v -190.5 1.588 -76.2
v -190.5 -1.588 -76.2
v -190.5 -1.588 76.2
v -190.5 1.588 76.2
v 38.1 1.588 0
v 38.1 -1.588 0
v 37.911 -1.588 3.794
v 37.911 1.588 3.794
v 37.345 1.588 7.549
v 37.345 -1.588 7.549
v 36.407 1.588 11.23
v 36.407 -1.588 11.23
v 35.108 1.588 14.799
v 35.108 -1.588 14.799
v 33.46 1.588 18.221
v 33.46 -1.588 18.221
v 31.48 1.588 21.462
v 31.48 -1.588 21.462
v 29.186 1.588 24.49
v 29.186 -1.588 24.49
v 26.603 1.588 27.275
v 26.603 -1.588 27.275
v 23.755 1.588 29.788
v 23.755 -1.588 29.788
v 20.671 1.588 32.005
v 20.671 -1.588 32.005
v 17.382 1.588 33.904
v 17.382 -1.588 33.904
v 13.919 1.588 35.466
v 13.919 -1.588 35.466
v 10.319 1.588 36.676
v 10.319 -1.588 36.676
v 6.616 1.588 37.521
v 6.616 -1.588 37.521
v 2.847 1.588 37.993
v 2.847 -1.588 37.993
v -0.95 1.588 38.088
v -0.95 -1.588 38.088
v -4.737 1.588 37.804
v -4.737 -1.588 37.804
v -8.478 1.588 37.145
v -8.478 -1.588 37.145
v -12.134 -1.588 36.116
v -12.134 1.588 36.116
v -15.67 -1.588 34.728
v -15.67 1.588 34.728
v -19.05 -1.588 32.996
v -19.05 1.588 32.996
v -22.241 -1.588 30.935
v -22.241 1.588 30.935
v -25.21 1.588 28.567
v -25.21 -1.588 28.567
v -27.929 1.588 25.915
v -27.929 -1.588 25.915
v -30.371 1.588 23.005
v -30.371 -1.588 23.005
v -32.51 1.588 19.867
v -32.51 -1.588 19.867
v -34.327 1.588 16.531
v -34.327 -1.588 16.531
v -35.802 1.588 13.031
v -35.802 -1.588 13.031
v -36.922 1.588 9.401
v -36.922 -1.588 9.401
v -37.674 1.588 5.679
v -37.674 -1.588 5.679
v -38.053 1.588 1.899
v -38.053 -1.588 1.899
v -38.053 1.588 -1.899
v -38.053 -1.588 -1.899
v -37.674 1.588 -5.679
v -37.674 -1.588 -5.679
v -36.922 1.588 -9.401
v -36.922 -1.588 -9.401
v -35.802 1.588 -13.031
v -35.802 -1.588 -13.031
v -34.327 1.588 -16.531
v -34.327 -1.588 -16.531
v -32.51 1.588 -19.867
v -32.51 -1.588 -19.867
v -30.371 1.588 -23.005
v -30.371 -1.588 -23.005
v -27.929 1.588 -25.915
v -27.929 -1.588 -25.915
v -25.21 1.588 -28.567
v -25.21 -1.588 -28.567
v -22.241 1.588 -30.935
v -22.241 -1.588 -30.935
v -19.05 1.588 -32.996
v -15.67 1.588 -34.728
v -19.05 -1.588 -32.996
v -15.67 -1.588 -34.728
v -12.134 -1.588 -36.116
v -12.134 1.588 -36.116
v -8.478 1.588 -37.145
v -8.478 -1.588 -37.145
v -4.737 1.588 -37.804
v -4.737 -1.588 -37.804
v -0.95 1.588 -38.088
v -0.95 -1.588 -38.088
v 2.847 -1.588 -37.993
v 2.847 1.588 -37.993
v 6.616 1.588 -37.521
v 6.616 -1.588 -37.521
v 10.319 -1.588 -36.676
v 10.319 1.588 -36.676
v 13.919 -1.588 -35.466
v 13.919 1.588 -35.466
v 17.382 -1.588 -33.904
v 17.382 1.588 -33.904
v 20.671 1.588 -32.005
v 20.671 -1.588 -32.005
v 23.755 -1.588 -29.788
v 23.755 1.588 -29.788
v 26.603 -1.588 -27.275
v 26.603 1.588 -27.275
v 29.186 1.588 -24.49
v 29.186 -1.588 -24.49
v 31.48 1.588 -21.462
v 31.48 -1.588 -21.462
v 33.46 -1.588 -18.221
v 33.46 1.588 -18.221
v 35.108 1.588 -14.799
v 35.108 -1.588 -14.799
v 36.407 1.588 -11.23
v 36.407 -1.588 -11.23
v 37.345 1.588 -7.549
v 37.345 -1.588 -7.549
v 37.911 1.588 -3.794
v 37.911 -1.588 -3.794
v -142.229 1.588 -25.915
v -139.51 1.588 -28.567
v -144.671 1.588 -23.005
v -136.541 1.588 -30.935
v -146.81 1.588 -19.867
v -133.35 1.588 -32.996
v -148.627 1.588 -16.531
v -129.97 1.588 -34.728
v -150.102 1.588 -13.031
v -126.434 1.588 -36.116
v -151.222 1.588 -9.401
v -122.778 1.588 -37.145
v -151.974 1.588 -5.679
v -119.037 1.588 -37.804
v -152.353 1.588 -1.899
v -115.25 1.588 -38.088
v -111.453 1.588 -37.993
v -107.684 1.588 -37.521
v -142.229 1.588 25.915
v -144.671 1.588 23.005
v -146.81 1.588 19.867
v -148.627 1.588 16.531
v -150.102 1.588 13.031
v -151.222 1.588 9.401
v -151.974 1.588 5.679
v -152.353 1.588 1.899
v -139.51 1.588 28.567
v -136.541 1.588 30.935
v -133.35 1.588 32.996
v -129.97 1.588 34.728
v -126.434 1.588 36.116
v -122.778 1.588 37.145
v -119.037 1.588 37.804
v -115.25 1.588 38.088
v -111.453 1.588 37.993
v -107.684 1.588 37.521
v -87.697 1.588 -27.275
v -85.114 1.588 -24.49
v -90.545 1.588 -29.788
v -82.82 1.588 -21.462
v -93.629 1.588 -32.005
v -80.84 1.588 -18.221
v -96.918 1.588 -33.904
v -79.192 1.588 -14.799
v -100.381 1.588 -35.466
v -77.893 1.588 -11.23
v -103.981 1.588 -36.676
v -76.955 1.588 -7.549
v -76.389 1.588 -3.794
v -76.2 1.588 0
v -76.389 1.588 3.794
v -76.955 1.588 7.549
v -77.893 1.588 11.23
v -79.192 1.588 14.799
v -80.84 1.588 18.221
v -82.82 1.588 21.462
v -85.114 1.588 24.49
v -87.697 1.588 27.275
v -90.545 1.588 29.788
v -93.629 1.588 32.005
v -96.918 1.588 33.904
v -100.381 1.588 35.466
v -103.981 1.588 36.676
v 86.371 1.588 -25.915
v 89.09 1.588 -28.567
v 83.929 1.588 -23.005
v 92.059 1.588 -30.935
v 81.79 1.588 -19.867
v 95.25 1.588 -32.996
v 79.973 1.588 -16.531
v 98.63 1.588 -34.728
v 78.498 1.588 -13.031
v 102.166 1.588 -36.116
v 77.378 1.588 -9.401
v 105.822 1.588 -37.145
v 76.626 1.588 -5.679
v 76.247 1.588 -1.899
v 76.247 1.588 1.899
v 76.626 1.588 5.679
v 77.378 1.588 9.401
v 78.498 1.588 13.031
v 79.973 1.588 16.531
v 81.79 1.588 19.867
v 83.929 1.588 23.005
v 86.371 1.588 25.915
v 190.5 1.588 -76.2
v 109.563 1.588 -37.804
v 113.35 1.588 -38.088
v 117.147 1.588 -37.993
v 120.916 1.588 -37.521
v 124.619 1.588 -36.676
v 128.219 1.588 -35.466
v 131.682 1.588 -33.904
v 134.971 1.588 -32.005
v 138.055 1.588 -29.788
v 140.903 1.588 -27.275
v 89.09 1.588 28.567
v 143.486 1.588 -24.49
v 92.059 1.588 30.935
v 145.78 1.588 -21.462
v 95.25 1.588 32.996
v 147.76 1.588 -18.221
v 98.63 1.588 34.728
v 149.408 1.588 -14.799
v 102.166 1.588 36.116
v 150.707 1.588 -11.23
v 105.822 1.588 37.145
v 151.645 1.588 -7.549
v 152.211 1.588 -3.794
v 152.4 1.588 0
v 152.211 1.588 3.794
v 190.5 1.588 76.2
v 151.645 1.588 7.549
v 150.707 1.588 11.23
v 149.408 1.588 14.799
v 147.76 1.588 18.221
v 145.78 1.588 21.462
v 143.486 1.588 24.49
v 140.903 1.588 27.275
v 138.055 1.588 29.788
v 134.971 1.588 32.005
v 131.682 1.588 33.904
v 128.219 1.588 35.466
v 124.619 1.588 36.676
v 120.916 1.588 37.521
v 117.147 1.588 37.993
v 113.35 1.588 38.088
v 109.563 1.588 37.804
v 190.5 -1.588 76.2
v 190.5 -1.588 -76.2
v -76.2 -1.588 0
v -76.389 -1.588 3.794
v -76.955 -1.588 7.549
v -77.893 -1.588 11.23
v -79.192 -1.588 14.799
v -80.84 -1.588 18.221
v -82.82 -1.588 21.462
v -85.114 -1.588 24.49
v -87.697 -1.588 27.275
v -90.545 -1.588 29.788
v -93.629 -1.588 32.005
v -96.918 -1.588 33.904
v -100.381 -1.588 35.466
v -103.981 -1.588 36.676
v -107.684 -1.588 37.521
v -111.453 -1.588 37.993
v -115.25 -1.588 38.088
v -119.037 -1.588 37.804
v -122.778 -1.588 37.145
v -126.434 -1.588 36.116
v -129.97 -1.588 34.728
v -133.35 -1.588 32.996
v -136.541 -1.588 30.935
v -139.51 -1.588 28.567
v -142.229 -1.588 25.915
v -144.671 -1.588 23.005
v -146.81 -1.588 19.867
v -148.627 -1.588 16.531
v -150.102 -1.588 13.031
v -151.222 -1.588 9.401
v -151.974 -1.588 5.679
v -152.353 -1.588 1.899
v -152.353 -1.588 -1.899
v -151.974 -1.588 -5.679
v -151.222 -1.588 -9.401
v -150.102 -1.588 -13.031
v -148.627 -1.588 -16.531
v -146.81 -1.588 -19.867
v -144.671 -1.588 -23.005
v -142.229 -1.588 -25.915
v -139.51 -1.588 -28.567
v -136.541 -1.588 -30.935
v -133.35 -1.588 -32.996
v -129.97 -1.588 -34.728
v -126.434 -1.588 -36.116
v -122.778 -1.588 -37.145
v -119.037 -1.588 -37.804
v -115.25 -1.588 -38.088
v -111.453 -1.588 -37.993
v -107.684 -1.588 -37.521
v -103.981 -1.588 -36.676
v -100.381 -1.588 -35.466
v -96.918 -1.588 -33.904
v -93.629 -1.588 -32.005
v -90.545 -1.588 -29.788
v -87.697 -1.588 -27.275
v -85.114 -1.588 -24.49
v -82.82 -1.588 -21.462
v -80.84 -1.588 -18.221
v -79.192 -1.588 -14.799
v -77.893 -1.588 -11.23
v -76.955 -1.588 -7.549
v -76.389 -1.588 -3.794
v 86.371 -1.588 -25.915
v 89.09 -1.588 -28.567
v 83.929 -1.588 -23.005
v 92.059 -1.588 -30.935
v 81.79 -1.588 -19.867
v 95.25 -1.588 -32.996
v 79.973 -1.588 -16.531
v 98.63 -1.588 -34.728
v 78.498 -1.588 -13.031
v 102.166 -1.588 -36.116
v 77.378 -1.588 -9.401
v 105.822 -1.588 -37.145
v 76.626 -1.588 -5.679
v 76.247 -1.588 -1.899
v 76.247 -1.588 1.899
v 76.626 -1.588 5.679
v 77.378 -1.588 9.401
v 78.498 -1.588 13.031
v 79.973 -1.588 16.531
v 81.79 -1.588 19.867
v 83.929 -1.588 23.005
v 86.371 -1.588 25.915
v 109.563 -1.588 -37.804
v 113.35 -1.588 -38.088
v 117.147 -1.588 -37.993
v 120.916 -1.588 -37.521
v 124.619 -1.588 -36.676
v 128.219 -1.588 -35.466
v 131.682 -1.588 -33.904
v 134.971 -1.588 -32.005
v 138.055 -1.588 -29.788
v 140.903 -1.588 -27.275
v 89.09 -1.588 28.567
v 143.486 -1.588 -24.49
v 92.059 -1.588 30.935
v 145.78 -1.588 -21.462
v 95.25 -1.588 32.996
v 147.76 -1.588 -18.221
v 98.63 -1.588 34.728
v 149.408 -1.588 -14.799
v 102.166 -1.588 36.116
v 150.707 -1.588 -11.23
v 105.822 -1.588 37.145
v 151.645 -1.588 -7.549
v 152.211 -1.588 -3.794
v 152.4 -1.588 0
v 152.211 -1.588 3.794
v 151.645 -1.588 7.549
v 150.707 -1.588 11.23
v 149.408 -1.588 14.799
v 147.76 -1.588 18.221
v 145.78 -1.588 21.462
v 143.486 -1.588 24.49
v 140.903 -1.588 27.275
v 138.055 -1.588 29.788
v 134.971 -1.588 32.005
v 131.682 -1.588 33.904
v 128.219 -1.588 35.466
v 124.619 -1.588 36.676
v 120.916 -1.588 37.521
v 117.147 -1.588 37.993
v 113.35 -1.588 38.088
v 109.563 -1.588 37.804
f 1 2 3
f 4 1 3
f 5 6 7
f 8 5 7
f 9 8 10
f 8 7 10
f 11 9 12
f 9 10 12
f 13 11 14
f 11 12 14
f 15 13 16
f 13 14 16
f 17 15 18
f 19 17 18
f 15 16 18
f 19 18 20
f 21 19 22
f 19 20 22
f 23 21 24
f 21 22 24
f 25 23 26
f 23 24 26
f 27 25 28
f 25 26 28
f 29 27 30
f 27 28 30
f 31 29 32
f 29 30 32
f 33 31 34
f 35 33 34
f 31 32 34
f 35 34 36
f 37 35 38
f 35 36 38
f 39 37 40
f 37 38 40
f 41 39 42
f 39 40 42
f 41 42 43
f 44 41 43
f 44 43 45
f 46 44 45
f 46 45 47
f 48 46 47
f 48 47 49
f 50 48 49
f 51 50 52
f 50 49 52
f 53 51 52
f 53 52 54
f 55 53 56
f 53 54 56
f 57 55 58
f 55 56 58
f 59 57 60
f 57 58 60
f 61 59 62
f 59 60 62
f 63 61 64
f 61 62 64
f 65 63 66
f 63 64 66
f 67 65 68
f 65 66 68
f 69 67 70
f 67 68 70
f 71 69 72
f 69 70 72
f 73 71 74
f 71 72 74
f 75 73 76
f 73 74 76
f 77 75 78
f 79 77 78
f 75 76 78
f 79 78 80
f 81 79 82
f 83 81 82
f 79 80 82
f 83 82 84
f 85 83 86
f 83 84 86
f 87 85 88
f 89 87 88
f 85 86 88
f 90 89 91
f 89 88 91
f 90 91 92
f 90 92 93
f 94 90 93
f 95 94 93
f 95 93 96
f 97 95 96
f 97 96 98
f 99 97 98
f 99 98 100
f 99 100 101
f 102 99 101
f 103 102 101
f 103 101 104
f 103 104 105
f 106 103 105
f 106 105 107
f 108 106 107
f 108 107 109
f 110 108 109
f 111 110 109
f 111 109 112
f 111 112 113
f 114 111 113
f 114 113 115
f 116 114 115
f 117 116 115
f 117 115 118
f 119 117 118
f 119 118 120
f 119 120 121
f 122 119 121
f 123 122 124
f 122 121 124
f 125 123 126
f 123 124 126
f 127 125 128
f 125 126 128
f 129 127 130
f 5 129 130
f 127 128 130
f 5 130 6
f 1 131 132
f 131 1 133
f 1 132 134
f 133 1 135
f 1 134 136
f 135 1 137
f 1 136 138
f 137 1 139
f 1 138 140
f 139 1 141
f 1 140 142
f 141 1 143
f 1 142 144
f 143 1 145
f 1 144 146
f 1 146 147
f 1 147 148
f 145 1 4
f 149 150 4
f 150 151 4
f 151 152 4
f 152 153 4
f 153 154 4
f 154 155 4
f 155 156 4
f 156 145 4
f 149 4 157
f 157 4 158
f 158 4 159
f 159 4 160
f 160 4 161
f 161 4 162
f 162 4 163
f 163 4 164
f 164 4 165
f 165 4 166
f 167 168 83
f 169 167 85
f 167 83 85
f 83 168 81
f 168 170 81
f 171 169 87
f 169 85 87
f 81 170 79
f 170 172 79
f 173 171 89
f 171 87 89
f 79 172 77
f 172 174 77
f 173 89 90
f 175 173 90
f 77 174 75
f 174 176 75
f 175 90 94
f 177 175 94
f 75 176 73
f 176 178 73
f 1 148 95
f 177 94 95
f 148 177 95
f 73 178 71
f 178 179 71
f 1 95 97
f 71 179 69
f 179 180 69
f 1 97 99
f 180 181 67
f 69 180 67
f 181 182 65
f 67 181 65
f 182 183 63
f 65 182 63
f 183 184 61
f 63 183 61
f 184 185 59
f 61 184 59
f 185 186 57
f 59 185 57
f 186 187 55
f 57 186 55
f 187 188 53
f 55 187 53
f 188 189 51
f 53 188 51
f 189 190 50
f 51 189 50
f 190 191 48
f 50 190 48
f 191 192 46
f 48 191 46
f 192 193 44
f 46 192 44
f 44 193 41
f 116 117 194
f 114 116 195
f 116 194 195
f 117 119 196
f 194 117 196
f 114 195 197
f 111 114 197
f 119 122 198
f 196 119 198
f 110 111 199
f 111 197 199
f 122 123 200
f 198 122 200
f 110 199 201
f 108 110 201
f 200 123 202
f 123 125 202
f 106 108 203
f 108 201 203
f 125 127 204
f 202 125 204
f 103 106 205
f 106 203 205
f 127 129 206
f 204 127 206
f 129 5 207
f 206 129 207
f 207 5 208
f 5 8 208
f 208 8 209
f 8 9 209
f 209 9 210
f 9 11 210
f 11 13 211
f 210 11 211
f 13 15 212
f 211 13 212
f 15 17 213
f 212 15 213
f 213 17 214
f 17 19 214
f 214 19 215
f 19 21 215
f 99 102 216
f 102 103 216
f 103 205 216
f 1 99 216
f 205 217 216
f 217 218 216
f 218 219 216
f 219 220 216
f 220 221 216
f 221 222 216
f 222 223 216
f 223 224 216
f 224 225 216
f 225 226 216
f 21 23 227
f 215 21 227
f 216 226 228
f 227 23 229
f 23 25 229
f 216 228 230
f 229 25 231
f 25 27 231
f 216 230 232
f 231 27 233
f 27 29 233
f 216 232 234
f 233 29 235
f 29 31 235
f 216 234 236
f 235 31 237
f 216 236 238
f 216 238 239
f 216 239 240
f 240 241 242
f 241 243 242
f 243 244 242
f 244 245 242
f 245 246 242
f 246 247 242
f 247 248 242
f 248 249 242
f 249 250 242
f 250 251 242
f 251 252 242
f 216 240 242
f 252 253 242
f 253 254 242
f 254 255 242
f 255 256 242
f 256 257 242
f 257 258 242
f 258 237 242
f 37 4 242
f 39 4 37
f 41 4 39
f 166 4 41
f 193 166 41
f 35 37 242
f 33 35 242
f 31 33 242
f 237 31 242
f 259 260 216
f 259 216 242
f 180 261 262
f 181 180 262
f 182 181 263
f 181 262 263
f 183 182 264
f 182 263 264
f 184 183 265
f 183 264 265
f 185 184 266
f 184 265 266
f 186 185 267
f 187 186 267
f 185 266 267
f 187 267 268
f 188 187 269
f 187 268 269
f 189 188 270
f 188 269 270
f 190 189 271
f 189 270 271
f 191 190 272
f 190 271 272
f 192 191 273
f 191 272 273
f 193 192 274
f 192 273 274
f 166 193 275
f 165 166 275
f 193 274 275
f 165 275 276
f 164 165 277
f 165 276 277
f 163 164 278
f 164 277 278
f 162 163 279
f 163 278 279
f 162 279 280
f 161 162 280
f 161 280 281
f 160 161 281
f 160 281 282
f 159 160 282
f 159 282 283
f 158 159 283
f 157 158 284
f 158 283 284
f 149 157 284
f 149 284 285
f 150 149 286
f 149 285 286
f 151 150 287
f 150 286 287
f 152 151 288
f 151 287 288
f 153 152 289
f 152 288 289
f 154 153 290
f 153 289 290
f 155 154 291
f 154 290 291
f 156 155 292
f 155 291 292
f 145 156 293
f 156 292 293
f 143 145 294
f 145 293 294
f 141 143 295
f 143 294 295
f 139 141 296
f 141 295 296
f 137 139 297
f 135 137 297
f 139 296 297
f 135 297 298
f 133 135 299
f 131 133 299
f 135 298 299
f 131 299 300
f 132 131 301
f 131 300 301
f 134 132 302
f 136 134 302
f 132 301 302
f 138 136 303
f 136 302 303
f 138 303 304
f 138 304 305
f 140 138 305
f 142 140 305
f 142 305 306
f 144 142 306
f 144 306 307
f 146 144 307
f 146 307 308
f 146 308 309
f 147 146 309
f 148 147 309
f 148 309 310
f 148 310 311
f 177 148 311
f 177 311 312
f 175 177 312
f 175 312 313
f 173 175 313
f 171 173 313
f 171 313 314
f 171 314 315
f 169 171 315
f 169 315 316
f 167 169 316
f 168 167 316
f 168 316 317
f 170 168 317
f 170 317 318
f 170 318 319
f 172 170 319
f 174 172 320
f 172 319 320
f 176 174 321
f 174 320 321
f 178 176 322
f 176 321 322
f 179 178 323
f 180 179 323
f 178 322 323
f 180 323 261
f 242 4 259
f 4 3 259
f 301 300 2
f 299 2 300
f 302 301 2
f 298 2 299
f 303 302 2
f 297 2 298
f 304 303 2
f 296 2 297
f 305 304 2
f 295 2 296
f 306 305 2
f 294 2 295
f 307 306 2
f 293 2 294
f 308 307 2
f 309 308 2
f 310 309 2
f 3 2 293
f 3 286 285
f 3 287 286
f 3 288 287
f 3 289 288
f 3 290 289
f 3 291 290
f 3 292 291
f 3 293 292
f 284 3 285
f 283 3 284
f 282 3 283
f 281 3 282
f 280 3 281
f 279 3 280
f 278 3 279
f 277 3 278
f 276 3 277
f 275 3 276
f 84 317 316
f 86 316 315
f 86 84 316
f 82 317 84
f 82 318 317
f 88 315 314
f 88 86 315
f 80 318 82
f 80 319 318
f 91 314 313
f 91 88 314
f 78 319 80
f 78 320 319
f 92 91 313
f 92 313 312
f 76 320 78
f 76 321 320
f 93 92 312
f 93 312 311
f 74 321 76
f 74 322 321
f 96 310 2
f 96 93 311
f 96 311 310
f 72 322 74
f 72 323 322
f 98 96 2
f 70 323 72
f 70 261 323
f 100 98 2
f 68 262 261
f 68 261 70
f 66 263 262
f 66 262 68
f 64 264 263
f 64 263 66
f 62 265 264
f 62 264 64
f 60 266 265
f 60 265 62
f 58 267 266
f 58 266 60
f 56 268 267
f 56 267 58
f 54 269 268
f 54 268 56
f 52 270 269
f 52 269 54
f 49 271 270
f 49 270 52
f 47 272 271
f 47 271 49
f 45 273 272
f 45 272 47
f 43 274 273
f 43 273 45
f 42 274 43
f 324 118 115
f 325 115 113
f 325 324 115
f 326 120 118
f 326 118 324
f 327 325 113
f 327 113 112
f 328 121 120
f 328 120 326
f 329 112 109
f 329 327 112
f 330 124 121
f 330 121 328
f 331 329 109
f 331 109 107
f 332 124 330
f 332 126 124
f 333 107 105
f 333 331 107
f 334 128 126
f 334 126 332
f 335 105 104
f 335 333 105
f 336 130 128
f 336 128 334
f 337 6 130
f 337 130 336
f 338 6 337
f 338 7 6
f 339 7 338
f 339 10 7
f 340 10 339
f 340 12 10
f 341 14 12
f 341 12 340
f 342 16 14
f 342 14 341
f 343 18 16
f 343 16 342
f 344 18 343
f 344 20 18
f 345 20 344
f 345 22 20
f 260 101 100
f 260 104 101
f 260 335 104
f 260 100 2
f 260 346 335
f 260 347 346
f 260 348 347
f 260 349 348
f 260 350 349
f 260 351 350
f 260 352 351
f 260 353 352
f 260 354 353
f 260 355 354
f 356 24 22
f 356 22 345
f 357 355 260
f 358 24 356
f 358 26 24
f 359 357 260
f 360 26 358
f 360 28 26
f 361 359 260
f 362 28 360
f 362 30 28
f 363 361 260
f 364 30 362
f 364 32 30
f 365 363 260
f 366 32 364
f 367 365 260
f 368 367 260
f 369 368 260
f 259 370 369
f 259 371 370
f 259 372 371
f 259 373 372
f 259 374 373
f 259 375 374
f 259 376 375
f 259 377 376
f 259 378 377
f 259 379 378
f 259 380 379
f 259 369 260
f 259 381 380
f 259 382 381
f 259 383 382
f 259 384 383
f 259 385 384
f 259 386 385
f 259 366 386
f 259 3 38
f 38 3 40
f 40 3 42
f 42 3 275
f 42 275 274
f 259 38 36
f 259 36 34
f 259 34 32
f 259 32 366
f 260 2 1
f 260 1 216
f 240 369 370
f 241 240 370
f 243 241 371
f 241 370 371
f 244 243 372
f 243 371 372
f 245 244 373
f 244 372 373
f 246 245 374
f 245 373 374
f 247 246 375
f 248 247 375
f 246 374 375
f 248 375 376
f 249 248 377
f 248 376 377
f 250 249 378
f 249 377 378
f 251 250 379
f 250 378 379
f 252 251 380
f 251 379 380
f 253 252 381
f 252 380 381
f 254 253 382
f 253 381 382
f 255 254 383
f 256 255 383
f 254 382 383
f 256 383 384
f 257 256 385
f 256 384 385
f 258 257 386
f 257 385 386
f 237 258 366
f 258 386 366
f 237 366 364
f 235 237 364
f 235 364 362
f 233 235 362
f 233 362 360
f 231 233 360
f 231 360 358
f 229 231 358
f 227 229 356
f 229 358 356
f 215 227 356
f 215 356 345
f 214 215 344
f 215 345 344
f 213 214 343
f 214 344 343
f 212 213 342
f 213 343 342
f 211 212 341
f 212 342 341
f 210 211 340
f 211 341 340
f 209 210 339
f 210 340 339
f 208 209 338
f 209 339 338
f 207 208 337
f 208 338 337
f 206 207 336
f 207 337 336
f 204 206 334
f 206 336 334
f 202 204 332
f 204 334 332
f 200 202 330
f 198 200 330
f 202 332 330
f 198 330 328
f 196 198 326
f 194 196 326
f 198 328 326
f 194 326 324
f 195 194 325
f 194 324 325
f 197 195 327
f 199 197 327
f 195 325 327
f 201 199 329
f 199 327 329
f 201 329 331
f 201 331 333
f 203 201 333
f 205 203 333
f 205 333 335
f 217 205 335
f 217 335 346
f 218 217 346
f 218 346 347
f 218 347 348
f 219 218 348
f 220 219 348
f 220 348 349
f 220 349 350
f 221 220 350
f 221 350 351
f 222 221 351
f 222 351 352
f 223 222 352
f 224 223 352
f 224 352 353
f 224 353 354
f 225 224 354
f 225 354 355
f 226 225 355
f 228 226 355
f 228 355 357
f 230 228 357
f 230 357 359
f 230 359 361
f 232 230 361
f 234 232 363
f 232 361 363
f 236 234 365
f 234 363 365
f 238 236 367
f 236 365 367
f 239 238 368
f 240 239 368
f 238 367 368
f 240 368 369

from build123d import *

# Parameters (mm, degrees)
F0_W     = 381
F0_H     = 152.4
F1_DEPTH = 1.5875
F2_R     = 38.1
F3_DEPTH = 3.175
F4_R     = 38.1
F5_DEPTH = 3.175
F6_R     = 38.1
F7_DEPTH = 3.175


with BuildPart() as f1:
    # F0 (on Front) → F1 (new body, symmetric)
    with BuildSketch(Plane.XZ):
        Rectangle(F0_W, F0_H)
    extrude(amount=F1_DEPTH, both=True)

    # F2 (on face) → F3 (cut)
    with BuildSketch(Plane.XZ.offset(1.5875)):
        Circle(F2_R)
    extrude(amount=-F3_DEPTH, mode=Mode.SUBTRACT)

    # F4 (on face) → F5 (cut)
    with BuildSketch(Plane.XZ.offset(1.5875)):
        with Locations((-114.3, 0)):
            Circle(F4_R)
    extrude(amount=-F5_DEPTH, mode=Mode.SUBTRACT)

    # F6 (on face) → F7 (cut)
    with BuildSketch(Plane.XZ.offset(1.5875)):
        with Locations((114.3, 0)):
            Circle(F6_R)
    extrude(amount=-F7_DEPTH, mode=Mode.SUBTRACT)


solid = f1.part
